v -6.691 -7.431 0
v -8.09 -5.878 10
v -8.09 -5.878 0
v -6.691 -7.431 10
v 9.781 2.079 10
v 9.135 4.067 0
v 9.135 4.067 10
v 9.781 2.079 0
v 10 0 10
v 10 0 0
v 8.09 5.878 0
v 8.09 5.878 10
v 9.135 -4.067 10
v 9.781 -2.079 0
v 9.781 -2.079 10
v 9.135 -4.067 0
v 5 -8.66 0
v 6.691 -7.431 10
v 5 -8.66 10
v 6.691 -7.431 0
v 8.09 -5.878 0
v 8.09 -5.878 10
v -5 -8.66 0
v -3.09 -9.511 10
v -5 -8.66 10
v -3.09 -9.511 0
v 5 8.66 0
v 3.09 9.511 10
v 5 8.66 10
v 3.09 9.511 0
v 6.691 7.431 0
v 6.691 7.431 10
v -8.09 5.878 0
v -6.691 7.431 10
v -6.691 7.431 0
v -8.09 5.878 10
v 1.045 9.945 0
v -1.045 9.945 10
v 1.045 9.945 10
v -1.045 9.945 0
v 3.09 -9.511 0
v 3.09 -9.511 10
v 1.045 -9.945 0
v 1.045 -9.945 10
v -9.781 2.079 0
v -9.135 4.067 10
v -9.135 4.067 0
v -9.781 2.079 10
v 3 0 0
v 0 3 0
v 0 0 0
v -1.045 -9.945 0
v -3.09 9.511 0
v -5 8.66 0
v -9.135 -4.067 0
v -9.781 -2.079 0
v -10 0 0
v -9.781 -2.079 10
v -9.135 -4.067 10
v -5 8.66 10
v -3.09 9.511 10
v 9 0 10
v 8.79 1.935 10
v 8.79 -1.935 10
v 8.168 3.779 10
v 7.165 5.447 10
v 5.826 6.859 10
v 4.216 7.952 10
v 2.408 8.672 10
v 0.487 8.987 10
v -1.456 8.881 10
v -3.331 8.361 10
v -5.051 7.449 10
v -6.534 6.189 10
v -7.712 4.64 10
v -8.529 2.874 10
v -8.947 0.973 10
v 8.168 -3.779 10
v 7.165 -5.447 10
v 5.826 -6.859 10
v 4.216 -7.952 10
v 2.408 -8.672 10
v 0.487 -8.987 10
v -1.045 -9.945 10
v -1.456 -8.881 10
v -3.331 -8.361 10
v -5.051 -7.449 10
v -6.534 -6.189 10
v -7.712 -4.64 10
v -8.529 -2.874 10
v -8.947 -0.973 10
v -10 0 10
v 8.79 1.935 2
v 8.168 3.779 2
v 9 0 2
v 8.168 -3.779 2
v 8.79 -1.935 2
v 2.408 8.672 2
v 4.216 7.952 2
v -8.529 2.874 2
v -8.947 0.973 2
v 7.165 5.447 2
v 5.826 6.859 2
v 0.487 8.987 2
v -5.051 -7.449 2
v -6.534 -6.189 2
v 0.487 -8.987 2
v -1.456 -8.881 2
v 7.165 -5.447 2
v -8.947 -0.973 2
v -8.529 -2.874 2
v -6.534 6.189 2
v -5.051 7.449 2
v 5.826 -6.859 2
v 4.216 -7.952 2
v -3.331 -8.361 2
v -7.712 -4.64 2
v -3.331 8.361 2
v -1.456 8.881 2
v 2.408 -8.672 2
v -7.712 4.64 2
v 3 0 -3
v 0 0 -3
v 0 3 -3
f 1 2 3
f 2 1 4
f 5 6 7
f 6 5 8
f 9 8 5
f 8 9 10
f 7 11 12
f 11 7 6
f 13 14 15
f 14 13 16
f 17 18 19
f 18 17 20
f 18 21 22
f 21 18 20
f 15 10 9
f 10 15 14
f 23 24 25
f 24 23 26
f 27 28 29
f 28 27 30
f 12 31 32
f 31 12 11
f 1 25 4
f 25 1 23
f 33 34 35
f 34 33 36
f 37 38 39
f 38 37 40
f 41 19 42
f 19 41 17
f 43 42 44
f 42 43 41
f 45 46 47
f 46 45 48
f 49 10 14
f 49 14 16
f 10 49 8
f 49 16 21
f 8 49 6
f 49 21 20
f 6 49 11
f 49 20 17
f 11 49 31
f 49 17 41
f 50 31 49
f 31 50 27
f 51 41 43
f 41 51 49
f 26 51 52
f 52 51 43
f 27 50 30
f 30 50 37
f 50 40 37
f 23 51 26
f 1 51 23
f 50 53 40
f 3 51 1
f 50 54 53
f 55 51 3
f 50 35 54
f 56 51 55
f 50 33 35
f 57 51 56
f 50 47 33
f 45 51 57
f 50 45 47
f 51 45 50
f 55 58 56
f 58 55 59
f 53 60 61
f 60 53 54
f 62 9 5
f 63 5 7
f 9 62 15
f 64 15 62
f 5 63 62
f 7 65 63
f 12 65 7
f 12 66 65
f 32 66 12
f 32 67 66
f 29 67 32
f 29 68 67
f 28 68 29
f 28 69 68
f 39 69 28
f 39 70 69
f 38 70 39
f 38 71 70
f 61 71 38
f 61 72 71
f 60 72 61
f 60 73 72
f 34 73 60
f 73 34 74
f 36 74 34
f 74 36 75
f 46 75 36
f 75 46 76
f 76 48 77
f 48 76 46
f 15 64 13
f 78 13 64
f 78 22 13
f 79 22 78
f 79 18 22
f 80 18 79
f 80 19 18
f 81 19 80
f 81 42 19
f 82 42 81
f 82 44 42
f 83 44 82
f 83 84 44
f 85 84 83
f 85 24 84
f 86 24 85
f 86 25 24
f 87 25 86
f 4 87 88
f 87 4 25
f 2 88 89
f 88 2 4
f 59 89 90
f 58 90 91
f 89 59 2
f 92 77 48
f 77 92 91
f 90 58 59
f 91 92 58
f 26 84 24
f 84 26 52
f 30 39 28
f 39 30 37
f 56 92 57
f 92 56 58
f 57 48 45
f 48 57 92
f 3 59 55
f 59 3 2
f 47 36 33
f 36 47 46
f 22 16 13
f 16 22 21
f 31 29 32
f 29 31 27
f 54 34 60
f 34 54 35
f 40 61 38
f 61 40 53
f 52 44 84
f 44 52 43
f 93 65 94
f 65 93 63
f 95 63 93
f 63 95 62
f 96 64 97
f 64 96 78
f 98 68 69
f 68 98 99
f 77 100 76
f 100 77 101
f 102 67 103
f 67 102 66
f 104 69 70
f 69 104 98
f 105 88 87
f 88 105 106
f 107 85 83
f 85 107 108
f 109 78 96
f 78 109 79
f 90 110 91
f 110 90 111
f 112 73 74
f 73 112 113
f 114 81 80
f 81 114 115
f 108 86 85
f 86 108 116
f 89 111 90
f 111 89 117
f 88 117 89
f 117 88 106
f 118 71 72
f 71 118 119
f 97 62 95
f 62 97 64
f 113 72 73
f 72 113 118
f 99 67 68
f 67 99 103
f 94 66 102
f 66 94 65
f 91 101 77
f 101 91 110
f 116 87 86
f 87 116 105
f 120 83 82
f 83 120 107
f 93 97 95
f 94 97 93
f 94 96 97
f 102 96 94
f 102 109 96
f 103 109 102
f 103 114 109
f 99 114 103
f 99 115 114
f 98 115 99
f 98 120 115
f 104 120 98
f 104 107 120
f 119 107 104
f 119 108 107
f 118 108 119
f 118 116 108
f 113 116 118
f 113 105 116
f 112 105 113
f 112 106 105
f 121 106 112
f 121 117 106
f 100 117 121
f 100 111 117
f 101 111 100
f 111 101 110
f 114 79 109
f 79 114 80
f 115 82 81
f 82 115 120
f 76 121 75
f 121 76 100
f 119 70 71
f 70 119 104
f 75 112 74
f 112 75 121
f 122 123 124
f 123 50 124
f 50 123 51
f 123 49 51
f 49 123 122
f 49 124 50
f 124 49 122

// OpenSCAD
difference()
{
	cylinder(10,10,10);
	translate([0,0,2])
	{	
		cylinder(11,9,9);
	}
}

//Triangle
scale(.3)
{
	rotate([0,90,0])
	{
		difference()
		{
	    		cube(10);
			translate([-3,10,0])
			{
				rotate([45,0,0])
				{
					cube(30);
				}
			}
		}
	}
}
